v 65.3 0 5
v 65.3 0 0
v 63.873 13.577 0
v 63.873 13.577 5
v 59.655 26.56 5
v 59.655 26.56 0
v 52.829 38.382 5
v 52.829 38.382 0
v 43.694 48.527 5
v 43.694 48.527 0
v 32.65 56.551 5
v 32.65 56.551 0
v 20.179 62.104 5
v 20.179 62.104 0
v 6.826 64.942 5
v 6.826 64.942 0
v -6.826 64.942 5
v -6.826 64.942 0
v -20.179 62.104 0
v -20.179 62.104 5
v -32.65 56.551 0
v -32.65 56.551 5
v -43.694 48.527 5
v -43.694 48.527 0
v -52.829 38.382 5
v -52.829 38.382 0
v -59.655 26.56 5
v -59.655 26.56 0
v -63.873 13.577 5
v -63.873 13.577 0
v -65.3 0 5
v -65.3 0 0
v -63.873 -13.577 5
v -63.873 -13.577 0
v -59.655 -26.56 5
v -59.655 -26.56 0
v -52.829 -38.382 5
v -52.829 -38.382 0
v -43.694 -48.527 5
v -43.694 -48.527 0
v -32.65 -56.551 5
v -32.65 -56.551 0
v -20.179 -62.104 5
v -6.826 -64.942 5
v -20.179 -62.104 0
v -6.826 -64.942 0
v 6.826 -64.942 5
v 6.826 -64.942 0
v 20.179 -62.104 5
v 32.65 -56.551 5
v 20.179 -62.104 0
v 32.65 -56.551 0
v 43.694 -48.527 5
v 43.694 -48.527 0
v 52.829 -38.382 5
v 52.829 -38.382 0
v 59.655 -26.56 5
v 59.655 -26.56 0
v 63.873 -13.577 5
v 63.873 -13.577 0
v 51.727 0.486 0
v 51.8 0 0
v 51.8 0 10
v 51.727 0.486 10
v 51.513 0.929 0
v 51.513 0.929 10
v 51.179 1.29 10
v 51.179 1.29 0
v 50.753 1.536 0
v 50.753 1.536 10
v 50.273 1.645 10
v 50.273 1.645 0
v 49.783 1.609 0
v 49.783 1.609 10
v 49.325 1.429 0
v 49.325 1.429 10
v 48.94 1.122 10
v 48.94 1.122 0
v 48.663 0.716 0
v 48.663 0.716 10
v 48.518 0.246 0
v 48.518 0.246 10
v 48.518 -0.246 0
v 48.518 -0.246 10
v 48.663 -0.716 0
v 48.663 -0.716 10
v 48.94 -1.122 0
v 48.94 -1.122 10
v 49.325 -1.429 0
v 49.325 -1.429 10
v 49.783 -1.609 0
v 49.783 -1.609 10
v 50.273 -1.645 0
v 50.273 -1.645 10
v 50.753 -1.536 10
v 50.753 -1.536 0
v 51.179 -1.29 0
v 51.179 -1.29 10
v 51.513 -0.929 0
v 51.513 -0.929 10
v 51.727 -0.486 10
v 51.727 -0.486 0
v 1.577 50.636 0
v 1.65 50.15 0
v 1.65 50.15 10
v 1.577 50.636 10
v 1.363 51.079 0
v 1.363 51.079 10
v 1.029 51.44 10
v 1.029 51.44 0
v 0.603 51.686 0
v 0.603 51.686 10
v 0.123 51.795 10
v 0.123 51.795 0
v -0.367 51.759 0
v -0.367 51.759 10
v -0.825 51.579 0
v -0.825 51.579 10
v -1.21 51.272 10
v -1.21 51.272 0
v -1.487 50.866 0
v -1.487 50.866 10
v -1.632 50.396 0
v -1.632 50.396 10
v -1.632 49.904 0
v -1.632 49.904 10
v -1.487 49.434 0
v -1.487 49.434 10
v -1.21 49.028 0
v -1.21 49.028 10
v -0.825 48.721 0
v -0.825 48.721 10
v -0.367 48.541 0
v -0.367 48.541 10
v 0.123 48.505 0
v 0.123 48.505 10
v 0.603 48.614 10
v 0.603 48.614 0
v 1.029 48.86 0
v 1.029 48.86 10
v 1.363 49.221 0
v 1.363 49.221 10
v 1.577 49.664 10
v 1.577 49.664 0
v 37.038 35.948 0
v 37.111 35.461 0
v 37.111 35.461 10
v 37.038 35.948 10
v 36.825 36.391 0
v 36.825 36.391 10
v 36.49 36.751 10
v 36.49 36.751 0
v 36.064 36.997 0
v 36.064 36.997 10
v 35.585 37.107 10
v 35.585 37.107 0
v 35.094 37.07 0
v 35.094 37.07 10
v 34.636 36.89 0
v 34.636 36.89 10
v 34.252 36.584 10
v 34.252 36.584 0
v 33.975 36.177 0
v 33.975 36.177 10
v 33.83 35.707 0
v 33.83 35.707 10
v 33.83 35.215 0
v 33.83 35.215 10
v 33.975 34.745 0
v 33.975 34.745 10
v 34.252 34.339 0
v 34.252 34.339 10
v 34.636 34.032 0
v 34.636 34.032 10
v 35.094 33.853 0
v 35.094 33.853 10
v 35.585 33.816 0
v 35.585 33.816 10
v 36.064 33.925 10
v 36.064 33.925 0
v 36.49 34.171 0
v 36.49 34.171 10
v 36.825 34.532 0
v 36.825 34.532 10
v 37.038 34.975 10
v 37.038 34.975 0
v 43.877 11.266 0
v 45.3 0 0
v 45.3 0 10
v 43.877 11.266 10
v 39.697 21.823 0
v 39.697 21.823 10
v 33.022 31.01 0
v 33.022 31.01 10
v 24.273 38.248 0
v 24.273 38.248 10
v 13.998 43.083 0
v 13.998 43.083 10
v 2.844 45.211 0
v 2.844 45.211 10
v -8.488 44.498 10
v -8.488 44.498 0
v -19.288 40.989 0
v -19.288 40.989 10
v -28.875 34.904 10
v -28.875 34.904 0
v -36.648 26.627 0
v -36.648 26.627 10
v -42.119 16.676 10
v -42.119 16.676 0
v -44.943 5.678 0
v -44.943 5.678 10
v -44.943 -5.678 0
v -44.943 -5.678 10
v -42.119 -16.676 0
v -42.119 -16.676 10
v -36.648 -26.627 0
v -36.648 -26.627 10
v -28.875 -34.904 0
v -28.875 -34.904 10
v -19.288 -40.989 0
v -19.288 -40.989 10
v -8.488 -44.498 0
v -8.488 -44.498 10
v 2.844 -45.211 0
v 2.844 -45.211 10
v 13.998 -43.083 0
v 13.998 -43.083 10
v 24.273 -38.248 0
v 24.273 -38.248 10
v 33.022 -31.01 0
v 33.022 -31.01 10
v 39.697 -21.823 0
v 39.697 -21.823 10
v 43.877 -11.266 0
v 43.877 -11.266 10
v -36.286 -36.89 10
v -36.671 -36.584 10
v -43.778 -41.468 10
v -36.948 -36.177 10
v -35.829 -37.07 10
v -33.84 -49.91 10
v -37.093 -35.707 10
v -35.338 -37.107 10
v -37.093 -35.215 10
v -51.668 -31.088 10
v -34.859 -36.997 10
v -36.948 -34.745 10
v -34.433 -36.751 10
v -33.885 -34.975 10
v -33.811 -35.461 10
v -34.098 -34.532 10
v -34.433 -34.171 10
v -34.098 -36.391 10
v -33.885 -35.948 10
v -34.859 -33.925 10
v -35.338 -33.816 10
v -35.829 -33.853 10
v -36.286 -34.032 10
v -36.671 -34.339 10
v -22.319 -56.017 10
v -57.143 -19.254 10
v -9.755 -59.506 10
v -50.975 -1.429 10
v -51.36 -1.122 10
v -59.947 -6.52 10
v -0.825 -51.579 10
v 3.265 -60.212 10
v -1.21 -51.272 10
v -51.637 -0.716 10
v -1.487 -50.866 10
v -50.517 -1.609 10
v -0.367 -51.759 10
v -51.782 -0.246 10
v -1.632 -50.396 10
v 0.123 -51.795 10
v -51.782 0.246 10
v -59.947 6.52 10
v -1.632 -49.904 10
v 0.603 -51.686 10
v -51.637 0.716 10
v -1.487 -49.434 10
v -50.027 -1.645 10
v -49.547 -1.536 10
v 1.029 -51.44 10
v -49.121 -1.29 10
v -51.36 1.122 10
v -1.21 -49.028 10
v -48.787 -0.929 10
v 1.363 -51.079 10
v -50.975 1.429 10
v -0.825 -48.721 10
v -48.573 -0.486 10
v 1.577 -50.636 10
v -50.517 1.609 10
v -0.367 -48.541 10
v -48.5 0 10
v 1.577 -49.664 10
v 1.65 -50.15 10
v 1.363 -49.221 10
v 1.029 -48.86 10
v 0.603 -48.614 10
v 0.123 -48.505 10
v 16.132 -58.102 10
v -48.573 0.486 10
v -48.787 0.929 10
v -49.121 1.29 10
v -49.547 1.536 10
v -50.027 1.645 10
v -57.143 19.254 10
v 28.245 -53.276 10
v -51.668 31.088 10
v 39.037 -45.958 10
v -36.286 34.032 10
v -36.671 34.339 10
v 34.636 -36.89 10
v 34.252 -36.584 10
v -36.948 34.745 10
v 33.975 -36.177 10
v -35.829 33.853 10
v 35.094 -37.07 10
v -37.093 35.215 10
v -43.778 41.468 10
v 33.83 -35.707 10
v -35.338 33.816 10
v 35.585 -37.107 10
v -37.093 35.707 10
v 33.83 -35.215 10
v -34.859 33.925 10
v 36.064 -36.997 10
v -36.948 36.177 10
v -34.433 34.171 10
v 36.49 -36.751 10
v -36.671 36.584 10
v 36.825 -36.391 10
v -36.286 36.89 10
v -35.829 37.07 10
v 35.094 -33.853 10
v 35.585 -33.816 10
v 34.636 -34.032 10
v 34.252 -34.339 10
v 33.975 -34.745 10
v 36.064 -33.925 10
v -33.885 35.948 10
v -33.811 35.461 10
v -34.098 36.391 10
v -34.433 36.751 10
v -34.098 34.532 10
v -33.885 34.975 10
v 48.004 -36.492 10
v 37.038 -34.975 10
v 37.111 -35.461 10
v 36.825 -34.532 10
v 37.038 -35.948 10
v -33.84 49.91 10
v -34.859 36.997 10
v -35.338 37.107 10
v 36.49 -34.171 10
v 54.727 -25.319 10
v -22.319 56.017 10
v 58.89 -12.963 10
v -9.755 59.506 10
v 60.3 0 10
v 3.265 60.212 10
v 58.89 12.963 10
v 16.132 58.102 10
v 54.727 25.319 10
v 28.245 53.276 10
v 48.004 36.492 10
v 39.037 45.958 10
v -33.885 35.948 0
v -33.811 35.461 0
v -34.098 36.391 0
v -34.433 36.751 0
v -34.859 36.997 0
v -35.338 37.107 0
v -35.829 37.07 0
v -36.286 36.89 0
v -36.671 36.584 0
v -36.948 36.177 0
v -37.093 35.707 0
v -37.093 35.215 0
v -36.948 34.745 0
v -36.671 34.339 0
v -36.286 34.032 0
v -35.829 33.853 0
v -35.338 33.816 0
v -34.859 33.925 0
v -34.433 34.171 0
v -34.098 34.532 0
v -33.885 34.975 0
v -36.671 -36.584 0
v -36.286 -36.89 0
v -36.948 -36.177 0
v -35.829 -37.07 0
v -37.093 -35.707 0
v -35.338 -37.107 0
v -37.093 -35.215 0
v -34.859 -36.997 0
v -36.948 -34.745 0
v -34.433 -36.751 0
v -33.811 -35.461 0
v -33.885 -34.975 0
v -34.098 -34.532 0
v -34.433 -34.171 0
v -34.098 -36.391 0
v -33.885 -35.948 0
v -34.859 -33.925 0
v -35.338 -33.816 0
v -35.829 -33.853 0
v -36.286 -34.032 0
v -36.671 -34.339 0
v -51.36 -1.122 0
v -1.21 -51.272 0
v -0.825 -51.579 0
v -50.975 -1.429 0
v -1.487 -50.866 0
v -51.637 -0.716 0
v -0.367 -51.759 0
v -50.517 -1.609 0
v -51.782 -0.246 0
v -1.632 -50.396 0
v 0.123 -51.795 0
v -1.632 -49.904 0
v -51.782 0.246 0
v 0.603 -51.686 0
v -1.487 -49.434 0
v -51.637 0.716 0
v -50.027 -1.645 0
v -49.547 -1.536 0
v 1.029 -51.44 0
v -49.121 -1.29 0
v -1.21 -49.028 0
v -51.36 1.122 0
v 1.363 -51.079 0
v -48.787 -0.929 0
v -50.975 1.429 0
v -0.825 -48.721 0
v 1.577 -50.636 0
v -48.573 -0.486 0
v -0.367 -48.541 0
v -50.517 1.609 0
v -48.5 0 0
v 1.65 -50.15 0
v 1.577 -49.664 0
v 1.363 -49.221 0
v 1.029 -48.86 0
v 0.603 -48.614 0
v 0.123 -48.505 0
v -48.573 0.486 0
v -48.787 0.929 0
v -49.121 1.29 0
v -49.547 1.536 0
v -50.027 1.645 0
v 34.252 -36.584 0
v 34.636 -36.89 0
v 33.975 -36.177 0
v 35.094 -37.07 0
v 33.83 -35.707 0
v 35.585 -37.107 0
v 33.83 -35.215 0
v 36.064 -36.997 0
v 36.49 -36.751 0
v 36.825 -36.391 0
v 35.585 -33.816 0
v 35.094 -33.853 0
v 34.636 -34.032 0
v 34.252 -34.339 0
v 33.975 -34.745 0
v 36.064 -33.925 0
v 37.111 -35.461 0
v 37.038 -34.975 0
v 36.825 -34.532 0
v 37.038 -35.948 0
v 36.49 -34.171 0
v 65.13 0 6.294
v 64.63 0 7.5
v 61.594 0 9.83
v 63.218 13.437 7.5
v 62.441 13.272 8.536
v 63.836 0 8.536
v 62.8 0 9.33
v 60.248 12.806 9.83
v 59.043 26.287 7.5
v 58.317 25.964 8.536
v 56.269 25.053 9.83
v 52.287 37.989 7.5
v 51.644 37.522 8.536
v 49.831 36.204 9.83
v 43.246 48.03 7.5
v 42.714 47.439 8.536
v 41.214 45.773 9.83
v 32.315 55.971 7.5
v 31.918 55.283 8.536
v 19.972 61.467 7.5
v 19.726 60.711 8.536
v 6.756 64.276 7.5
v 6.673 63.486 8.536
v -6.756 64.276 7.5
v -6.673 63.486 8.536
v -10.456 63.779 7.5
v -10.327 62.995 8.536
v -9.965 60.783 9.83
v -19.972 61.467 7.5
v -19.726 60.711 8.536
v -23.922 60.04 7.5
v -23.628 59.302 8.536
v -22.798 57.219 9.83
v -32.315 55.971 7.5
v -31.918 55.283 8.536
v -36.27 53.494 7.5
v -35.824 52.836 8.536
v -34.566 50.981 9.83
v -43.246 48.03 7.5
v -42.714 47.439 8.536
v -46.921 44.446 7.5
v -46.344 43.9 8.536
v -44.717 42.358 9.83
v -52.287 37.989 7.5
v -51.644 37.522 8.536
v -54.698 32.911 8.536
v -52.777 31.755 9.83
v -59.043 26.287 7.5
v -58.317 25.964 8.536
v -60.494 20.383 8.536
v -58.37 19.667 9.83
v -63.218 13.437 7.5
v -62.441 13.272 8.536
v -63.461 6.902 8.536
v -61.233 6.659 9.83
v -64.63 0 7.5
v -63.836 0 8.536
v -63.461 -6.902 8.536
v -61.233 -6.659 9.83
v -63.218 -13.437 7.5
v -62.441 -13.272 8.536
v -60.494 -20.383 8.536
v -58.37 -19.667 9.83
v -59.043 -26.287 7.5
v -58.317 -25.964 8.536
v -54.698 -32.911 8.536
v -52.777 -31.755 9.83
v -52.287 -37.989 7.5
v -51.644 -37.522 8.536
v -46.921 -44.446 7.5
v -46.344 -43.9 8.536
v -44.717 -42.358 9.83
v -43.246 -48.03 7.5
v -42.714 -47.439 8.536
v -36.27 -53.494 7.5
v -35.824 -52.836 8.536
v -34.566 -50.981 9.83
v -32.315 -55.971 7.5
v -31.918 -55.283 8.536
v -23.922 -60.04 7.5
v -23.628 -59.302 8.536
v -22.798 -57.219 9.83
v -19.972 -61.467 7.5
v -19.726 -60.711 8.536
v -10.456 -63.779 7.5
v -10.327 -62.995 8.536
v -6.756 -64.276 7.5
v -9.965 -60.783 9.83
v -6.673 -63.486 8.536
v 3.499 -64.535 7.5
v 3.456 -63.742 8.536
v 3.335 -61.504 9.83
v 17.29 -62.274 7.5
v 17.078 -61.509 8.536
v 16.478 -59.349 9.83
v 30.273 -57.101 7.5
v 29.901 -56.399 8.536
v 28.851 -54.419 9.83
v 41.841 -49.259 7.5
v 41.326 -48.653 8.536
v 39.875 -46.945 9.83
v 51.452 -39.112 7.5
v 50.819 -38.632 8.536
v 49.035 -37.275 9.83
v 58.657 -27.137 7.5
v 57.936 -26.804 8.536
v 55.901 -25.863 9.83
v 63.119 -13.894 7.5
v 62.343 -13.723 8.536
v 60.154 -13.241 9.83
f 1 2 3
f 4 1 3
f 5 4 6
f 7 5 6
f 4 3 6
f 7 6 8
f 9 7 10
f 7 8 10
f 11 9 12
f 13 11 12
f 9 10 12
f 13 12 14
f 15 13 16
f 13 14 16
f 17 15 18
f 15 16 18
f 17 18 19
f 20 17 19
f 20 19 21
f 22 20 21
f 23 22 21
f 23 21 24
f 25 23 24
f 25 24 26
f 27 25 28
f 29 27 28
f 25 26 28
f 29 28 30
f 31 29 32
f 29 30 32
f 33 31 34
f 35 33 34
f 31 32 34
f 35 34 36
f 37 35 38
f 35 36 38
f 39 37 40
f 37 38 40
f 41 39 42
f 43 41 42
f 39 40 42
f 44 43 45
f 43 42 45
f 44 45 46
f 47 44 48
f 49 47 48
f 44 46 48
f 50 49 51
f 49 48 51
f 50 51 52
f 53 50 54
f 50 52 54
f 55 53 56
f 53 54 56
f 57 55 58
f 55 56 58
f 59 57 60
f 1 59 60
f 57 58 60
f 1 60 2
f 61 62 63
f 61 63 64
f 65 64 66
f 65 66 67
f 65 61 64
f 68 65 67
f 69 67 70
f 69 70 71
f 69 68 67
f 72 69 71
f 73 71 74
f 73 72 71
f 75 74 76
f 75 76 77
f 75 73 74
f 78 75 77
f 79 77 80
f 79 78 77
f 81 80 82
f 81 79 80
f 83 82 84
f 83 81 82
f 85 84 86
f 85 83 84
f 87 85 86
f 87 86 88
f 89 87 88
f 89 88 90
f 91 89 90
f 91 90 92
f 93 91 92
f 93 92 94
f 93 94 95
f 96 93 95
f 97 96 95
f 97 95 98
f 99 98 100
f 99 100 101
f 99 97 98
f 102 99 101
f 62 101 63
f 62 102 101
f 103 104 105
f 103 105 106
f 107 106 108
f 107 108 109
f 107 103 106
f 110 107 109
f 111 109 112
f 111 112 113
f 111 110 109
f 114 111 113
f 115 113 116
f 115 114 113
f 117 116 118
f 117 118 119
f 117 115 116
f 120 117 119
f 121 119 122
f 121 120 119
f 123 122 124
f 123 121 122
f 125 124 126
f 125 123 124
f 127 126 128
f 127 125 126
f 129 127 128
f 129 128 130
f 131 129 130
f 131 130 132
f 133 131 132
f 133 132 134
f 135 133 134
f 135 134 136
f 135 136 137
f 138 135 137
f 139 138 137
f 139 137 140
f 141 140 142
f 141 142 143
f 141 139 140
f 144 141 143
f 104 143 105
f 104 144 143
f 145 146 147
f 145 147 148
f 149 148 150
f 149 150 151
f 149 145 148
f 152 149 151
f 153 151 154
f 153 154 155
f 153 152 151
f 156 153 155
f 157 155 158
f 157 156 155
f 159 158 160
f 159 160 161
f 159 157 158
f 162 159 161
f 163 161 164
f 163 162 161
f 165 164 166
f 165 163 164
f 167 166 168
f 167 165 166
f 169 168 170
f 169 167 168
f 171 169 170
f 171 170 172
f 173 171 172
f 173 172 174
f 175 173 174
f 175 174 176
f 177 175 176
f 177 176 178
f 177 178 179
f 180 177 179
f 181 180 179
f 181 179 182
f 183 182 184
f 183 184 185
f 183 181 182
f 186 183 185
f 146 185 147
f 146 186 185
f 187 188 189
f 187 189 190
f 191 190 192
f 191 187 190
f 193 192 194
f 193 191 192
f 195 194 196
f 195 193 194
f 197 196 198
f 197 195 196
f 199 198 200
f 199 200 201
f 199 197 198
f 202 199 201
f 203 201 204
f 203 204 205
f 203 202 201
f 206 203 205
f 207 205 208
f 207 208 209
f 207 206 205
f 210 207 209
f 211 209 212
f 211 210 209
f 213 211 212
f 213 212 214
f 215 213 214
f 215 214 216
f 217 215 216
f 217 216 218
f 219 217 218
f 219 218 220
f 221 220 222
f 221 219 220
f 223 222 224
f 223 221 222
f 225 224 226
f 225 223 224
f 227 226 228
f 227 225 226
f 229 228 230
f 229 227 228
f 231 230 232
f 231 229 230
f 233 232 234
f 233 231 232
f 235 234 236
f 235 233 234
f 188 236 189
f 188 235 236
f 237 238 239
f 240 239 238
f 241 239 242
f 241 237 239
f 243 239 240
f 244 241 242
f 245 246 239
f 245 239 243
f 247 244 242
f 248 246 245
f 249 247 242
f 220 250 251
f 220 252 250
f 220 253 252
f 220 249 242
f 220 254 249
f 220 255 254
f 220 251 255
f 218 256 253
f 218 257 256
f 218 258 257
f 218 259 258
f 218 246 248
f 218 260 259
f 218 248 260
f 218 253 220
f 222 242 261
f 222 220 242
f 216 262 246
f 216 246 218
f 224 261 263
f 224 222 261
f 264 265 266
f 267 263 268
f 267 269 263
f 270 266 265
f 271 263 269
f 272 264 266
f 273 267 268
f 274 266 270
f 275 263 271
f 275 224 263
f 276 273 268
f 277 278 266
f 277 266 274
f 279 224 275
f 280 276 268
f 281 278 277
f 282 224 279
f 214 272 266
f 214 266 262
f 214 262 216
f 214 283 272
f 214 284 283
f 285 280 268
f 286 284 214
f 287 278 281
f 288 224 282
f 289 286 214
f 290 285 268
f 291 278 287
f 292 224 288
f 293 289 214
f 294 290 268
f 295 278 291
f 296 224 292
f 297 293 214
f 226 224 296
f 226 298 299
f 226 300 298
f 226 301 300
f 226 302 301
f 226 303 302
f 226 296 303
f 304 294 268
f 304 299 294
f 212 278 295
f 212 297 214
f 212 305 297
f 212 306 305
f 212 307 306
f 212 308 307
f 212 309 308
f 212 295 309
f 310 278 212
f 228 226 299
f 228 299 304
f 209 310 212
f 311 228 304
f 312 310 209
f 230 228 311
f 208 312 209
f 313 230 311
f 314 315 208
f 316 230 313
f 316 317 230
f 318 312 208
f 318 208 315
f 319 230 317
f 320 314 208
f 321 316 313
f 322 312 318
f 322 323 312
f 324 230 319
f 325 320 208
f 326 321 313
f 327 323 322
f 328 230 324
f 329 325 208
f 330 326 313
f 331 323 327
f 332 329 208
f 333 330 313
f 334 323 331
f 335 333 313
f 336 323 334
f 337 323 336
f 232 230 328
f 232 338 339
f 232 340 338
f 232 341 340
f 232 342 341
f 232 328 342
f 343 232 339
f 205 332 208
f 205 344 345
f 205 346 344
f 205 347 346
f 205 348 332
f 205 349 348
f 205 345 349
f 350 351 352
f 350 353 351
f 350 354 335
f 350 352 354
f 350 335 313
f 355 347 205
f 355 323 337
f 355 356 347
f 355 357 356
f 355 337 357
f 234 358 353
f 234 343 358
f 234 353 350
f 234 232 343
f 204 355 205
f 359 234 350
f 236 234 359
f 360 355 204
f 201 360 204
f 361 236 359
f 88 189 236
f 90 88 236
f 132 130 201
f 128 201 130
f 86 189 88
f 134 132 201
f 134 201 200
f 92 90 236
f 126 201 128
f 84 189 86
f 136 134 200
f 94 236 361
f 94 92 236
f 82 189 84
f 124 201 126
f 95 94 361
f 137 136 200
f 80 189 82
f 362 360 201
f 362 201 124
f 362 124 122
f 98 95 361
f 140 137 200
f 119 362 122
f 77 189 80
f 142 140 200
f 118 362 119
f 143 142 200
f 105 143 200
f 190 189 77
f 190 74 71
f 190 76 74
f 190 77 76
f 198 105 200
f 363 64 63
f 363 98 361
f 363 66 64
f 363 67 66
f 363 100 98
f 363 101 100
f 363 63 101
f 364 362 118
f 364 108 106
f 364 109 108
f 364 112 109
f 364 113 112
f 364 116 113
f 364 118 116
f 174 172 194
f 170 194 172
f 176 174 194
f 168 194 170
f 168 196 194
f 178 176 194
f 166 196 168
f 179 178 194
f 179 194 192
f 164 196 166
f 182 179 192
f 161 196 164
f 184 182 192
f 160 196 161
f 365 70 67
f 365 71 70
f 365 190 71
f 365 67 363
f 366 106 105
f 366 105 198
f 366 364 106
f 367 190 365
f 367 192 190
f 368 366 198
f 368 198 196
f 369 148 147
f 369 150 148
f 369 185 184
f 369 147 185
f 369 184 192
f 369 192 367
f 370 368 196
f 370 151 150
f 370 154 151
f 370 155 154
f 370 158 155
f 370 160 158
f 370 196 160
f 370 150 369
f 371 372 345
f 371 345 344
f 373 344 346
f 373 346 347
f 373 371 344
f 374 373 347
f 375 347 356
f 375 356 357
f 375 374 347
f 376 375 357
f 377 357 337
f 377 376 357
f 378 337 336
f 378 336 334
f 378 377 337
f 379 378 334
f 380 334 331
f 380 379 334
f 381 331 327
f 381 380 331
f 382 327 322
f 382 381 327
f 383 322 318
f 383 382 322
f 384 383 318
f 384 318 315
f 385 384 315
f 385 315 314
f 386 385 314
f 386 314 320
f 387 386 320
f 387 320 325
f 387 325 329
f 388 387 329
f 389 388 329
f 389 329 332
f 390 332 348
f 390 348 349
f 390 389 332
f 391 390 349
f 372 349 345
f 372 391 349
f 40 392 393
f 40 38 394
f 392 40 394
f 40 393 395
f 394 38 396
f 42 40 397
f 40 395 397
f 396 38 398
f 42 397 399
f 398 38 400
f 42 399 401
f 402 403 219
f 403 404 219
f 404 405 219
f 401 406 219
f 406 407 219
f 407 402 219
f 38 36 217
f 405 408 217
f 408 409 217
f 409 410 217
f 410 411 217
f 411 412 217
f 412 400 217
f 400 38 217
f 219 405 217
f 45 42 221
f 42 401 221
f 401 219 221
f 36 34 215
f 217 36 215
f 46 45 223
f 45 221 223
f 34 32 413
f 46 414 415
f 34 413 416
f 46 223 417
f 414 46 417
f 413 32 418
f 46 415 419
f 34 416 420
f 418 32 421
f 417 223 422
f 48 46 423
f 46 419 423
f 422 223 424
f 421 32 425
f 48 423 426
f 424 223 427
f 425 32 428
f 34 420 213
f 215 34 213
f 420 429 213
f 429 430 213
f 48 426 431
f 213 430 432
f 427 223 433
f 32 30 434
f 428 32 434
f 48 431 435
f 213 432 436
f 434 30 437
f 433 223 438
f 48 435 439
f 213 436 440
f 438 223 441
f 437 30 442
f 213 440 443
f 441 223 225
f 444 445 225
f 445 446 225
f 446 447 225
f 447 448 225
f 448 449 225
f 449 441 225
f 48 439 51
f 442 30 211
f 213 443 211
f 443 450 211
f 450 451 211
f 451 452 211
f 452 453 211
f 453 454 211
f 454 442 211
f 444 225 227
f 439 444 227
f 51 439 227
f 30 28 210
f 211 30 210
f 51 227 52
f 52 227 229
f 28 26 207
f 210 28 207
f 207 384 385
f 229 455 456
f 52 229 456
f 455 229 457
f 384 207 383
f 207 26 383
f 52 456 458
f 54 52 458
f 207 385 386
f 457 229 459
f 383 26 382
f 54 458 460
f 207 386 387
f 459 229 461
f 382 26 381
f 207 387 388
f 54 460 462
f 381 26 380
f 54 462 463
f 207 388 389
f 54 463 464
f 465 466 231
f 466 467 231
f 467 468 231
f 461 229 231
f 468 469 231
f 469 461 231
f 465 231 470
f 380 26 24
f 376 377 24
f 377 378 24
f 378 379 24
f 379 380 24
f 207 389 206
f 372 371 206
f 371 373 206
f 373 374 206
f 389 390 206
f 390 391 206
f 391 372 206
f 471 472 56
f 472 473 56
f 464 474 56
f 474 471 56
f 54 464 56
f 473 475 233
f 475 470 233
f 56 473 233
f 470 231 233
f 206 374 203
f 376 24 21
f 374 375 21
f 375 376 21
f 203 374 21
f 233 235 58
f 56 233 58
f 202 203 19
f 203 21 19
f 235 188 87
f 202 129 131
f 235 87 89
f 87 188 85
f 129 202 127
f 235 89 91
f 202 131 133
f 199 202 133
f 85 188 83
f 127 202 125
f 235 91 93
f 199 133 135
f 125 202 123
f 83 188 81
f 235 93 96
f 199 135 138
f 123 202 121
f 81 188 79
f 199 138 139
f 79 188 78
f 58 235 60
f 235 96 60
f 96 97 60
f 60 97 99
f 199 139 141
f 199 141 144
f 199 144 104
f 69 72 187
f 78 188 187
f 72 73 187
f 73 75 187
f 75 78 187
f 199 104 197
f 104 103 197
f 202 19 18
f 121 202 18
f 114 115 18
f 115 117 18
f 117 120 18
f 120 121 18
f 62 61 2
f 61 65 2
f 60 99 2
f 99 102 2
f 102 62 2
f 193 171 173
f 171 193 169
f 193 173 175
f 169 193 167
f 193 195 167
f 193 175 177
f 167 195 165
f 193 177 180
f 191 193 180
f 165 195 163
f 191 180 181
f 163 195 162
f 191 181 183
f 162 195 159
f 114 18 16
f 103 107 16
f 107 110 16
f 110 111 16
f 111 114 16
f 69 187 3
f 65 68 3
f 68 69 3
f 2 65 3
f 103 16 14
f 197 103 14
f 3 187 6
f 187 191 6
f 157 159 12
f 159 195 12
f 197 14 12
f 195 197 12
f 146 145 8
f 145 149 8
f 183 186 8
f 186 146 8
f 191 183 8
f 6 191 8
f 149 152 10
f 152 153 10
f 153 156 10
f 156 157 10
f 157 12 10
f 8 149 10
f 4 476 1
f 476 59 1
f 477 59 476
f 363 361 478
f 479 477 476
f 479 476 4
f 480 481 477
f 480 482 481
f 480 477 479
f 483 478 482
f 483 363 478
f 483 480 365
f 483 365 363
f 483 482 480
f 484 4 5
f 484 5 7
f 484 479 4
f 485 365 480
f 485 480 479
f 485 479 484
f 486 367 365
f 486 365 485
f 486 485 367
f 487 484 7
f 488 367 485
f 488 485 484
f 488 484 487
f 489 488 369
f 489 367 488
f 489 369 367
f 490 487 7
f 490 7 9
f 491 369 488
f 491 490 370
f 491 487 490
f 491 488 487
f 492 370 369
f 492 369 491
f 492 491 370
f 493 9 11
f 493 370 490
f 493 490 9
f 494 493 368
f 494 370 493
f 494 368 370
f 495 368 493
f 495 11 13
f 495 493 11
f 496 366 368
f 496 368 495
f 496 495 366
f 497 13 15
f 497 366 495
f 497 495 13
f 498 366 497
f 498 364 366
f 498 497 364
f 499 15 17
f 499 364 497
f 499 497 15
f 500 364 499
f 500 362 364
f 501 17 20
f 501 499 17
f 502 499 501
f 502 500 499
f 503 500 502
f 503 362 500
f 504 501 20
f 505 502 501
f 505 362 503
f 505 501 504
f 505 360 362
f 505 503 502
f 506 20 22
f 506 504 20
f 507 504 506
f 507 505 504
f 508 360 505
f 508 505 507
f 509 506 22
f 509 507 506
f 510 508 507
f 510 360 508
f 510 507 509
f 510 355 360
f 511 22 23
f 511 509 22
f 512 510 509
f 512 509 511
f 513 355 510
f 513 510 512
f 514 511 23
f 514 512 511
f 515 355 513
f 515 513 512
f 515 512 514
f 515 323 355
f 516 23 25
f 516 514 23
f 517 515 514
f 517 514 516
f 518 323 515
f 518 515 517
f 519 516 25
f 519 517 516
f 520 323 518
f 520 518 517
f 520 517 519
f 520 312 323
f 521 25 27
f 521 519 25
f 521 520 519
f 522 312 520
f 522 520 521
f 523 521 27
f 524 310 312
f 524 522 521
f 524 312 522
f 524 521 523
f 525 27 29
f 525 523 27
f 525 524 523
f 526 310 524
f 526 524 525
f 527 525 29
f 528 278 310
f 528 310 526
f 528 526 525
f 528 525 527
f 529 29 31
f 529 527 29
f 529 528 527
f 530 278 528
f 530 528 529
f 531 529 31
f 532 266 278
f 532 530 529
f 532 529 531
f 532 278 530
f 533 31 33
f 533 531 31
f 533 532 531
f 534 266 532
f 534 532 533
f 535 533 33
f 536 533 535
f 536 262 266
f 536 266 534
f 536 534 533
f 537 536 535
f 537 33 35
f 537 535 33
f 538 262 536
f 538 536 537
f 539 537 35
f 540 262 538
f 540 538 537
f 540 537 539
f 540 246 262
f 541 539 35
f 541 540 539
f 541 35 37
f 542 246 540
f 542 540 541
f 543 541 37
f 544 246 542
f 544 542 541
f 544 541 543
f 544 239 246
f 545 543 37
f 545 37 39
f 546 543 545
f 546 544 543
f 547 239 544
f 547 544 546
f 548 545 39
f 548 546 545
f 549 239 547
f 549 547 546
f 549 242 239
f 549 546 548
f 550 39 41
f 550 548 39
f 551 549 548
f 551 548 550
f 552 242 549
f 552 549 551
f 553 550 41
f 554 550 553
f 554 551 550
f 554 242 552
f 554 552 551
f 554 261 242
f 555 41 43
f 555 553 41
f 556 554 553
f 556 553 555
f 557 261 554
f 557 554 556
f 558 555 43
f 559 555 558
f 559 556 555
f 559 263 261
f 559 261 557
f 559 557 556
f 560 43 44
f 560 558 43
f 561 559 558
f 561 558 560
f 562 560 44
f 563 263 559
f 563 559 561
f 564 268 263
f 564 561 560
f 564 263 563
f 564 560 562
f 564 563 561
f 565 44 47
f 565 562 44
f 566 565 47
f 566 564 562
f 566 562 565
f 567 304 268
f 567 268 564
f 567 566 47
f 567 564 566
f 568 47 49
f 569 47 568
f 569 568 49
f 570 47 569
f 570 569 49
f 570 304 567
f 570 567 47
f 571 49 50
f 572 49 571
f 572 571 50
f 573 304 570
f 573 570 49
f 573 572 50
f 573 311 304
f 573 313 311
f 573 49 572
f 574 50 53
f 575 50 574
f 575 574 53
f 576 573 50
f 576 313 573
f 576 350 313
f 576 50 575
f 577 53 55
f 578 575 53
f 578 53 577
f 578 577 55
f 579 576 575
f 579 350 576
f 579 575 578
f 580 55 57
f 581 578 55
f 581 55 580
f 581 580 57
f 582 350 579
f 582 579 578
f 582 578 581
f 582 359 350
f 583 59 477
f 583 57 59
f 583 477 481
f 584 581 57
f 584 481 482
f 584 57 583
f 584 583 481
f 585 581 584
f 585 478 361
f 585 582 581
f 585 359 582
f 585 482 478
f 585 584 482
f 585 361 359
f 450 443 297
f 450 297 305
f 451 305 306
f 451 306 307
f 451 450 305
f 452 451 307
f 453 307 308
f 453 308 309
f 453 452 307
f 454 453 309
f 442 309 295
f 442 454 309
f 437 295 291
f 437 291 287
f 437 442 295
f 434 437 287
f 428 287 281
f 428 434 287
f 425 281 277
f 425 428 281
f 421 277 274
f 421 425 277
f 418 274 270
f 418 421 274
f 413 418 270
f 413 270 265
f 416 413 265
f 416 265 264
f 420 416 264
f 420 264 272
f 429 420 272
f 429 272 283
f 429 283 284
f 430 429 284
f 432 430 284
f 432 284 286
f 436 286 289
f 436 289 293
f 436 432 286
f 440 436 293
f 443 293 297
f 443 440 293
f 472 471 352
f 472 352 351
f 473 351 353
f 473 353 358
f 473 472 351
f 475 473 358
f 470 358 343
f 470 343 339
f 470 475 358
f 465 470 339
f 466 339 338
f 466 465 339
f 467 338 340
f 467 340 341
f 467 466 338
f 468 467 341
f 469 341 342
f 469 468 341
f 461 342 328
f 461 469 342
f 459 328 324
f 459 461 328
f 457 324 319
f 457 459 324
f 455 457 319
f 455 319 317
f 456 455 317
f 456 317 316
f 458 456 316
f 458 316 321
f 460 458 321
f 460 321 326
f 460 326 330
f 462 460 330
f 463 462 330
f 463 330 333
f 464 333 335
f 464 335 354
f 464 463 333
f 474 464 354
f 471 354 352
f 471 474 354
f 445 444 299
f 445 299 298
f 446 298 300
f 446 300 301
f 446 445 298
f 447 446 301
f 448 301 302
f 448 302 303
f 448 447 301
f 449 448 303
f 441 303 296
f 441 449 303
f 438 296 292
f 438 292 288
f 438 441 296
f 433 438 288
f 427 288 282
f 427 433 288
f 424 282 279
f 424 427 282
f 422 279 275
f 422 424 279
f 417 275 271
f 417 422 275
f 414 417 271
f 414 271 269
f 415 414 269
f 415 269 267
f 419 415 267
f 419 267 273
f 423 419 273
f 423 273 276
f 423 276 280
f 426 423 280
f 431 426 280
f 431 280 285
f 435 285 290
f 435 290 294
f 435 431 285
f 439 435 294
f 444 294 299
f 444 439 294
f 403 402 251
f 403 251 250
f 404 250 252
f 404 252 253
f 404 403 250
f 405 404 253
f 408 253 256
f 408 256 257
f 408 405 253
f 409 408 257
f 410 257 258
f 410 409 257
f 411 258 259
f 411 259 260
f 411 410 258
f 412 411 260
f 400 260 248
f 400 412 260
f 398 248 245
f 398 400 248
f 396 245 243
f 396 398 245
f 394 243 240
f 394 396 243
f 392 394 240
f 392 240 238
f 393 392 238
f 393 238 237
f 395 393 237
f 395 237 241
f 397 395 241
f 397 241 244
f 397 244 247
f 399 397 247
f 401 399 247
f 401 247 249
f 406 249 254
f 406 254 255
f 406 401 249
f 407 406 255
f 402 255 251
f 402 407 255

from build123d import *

# Parameters (mm, degrees)
SKETCH1_R           = 65.3
SKETCH1_R_2         = 45.3
SKETCH1_R_3         = 1.65
BOSS_EXTRUDE1_DEPTH = 10
FILLET1_R           = 5


with BuildPart() as part:
    # Sketch1 → Boss-Extrude1 (new body)
    with BuildSketch(Plane.XY):
        Circle(SKETCH1_R)
        Circle(SKETCH1_R_2, mode=Mode.SUBTRACT)
        with Locations((35.461405077, -35.461405077)):
            Circle(SKETCH1_R_3, mode=Mode.SUBTRACT)
        with Locations((0, -50.15)):
            Circle(SKETCH1_R_3, mode=Mode.SUBTRACT)
        with Locations((-35.461405077, -35.461405077)):
            Circle(SKETCH1_R_3, mode=Mode.SUBTRACT)
        with Locations((-50.15, 0)):
            Circle(SKETCH1_R_3, mode=Mode.SUBTRACT)
        with Locations((-35.461405077, 35.461405077)):
            Circle(SKETCH1_R_3, mode=Mode.SUBTRACT)
        with Locations((0, 50.15)):
            Circle(SKETCH1_R_3, mode=Mode.SUBTRACT)
        with Locations((35.461405077, 35.461405077)):
            Circle(SKETCH1_R_3, mode=Mode.SUBTRACT)
        with Locations((50.15, 0)):
            Circle(SKETCH1_R_3, mode=Mode.SUBTRACT)
    extrude(amount=BOSS_EXTRUDE1_DEPTH)

    # Fillet1
    fillet1_edges = [part.edges().sort_by_distance(p)[0] for p in [
        (-65.3, 0, 10),
    ]]
    fillet(fillet1_edges, radius=FILLET1_R)


solid = part.part
